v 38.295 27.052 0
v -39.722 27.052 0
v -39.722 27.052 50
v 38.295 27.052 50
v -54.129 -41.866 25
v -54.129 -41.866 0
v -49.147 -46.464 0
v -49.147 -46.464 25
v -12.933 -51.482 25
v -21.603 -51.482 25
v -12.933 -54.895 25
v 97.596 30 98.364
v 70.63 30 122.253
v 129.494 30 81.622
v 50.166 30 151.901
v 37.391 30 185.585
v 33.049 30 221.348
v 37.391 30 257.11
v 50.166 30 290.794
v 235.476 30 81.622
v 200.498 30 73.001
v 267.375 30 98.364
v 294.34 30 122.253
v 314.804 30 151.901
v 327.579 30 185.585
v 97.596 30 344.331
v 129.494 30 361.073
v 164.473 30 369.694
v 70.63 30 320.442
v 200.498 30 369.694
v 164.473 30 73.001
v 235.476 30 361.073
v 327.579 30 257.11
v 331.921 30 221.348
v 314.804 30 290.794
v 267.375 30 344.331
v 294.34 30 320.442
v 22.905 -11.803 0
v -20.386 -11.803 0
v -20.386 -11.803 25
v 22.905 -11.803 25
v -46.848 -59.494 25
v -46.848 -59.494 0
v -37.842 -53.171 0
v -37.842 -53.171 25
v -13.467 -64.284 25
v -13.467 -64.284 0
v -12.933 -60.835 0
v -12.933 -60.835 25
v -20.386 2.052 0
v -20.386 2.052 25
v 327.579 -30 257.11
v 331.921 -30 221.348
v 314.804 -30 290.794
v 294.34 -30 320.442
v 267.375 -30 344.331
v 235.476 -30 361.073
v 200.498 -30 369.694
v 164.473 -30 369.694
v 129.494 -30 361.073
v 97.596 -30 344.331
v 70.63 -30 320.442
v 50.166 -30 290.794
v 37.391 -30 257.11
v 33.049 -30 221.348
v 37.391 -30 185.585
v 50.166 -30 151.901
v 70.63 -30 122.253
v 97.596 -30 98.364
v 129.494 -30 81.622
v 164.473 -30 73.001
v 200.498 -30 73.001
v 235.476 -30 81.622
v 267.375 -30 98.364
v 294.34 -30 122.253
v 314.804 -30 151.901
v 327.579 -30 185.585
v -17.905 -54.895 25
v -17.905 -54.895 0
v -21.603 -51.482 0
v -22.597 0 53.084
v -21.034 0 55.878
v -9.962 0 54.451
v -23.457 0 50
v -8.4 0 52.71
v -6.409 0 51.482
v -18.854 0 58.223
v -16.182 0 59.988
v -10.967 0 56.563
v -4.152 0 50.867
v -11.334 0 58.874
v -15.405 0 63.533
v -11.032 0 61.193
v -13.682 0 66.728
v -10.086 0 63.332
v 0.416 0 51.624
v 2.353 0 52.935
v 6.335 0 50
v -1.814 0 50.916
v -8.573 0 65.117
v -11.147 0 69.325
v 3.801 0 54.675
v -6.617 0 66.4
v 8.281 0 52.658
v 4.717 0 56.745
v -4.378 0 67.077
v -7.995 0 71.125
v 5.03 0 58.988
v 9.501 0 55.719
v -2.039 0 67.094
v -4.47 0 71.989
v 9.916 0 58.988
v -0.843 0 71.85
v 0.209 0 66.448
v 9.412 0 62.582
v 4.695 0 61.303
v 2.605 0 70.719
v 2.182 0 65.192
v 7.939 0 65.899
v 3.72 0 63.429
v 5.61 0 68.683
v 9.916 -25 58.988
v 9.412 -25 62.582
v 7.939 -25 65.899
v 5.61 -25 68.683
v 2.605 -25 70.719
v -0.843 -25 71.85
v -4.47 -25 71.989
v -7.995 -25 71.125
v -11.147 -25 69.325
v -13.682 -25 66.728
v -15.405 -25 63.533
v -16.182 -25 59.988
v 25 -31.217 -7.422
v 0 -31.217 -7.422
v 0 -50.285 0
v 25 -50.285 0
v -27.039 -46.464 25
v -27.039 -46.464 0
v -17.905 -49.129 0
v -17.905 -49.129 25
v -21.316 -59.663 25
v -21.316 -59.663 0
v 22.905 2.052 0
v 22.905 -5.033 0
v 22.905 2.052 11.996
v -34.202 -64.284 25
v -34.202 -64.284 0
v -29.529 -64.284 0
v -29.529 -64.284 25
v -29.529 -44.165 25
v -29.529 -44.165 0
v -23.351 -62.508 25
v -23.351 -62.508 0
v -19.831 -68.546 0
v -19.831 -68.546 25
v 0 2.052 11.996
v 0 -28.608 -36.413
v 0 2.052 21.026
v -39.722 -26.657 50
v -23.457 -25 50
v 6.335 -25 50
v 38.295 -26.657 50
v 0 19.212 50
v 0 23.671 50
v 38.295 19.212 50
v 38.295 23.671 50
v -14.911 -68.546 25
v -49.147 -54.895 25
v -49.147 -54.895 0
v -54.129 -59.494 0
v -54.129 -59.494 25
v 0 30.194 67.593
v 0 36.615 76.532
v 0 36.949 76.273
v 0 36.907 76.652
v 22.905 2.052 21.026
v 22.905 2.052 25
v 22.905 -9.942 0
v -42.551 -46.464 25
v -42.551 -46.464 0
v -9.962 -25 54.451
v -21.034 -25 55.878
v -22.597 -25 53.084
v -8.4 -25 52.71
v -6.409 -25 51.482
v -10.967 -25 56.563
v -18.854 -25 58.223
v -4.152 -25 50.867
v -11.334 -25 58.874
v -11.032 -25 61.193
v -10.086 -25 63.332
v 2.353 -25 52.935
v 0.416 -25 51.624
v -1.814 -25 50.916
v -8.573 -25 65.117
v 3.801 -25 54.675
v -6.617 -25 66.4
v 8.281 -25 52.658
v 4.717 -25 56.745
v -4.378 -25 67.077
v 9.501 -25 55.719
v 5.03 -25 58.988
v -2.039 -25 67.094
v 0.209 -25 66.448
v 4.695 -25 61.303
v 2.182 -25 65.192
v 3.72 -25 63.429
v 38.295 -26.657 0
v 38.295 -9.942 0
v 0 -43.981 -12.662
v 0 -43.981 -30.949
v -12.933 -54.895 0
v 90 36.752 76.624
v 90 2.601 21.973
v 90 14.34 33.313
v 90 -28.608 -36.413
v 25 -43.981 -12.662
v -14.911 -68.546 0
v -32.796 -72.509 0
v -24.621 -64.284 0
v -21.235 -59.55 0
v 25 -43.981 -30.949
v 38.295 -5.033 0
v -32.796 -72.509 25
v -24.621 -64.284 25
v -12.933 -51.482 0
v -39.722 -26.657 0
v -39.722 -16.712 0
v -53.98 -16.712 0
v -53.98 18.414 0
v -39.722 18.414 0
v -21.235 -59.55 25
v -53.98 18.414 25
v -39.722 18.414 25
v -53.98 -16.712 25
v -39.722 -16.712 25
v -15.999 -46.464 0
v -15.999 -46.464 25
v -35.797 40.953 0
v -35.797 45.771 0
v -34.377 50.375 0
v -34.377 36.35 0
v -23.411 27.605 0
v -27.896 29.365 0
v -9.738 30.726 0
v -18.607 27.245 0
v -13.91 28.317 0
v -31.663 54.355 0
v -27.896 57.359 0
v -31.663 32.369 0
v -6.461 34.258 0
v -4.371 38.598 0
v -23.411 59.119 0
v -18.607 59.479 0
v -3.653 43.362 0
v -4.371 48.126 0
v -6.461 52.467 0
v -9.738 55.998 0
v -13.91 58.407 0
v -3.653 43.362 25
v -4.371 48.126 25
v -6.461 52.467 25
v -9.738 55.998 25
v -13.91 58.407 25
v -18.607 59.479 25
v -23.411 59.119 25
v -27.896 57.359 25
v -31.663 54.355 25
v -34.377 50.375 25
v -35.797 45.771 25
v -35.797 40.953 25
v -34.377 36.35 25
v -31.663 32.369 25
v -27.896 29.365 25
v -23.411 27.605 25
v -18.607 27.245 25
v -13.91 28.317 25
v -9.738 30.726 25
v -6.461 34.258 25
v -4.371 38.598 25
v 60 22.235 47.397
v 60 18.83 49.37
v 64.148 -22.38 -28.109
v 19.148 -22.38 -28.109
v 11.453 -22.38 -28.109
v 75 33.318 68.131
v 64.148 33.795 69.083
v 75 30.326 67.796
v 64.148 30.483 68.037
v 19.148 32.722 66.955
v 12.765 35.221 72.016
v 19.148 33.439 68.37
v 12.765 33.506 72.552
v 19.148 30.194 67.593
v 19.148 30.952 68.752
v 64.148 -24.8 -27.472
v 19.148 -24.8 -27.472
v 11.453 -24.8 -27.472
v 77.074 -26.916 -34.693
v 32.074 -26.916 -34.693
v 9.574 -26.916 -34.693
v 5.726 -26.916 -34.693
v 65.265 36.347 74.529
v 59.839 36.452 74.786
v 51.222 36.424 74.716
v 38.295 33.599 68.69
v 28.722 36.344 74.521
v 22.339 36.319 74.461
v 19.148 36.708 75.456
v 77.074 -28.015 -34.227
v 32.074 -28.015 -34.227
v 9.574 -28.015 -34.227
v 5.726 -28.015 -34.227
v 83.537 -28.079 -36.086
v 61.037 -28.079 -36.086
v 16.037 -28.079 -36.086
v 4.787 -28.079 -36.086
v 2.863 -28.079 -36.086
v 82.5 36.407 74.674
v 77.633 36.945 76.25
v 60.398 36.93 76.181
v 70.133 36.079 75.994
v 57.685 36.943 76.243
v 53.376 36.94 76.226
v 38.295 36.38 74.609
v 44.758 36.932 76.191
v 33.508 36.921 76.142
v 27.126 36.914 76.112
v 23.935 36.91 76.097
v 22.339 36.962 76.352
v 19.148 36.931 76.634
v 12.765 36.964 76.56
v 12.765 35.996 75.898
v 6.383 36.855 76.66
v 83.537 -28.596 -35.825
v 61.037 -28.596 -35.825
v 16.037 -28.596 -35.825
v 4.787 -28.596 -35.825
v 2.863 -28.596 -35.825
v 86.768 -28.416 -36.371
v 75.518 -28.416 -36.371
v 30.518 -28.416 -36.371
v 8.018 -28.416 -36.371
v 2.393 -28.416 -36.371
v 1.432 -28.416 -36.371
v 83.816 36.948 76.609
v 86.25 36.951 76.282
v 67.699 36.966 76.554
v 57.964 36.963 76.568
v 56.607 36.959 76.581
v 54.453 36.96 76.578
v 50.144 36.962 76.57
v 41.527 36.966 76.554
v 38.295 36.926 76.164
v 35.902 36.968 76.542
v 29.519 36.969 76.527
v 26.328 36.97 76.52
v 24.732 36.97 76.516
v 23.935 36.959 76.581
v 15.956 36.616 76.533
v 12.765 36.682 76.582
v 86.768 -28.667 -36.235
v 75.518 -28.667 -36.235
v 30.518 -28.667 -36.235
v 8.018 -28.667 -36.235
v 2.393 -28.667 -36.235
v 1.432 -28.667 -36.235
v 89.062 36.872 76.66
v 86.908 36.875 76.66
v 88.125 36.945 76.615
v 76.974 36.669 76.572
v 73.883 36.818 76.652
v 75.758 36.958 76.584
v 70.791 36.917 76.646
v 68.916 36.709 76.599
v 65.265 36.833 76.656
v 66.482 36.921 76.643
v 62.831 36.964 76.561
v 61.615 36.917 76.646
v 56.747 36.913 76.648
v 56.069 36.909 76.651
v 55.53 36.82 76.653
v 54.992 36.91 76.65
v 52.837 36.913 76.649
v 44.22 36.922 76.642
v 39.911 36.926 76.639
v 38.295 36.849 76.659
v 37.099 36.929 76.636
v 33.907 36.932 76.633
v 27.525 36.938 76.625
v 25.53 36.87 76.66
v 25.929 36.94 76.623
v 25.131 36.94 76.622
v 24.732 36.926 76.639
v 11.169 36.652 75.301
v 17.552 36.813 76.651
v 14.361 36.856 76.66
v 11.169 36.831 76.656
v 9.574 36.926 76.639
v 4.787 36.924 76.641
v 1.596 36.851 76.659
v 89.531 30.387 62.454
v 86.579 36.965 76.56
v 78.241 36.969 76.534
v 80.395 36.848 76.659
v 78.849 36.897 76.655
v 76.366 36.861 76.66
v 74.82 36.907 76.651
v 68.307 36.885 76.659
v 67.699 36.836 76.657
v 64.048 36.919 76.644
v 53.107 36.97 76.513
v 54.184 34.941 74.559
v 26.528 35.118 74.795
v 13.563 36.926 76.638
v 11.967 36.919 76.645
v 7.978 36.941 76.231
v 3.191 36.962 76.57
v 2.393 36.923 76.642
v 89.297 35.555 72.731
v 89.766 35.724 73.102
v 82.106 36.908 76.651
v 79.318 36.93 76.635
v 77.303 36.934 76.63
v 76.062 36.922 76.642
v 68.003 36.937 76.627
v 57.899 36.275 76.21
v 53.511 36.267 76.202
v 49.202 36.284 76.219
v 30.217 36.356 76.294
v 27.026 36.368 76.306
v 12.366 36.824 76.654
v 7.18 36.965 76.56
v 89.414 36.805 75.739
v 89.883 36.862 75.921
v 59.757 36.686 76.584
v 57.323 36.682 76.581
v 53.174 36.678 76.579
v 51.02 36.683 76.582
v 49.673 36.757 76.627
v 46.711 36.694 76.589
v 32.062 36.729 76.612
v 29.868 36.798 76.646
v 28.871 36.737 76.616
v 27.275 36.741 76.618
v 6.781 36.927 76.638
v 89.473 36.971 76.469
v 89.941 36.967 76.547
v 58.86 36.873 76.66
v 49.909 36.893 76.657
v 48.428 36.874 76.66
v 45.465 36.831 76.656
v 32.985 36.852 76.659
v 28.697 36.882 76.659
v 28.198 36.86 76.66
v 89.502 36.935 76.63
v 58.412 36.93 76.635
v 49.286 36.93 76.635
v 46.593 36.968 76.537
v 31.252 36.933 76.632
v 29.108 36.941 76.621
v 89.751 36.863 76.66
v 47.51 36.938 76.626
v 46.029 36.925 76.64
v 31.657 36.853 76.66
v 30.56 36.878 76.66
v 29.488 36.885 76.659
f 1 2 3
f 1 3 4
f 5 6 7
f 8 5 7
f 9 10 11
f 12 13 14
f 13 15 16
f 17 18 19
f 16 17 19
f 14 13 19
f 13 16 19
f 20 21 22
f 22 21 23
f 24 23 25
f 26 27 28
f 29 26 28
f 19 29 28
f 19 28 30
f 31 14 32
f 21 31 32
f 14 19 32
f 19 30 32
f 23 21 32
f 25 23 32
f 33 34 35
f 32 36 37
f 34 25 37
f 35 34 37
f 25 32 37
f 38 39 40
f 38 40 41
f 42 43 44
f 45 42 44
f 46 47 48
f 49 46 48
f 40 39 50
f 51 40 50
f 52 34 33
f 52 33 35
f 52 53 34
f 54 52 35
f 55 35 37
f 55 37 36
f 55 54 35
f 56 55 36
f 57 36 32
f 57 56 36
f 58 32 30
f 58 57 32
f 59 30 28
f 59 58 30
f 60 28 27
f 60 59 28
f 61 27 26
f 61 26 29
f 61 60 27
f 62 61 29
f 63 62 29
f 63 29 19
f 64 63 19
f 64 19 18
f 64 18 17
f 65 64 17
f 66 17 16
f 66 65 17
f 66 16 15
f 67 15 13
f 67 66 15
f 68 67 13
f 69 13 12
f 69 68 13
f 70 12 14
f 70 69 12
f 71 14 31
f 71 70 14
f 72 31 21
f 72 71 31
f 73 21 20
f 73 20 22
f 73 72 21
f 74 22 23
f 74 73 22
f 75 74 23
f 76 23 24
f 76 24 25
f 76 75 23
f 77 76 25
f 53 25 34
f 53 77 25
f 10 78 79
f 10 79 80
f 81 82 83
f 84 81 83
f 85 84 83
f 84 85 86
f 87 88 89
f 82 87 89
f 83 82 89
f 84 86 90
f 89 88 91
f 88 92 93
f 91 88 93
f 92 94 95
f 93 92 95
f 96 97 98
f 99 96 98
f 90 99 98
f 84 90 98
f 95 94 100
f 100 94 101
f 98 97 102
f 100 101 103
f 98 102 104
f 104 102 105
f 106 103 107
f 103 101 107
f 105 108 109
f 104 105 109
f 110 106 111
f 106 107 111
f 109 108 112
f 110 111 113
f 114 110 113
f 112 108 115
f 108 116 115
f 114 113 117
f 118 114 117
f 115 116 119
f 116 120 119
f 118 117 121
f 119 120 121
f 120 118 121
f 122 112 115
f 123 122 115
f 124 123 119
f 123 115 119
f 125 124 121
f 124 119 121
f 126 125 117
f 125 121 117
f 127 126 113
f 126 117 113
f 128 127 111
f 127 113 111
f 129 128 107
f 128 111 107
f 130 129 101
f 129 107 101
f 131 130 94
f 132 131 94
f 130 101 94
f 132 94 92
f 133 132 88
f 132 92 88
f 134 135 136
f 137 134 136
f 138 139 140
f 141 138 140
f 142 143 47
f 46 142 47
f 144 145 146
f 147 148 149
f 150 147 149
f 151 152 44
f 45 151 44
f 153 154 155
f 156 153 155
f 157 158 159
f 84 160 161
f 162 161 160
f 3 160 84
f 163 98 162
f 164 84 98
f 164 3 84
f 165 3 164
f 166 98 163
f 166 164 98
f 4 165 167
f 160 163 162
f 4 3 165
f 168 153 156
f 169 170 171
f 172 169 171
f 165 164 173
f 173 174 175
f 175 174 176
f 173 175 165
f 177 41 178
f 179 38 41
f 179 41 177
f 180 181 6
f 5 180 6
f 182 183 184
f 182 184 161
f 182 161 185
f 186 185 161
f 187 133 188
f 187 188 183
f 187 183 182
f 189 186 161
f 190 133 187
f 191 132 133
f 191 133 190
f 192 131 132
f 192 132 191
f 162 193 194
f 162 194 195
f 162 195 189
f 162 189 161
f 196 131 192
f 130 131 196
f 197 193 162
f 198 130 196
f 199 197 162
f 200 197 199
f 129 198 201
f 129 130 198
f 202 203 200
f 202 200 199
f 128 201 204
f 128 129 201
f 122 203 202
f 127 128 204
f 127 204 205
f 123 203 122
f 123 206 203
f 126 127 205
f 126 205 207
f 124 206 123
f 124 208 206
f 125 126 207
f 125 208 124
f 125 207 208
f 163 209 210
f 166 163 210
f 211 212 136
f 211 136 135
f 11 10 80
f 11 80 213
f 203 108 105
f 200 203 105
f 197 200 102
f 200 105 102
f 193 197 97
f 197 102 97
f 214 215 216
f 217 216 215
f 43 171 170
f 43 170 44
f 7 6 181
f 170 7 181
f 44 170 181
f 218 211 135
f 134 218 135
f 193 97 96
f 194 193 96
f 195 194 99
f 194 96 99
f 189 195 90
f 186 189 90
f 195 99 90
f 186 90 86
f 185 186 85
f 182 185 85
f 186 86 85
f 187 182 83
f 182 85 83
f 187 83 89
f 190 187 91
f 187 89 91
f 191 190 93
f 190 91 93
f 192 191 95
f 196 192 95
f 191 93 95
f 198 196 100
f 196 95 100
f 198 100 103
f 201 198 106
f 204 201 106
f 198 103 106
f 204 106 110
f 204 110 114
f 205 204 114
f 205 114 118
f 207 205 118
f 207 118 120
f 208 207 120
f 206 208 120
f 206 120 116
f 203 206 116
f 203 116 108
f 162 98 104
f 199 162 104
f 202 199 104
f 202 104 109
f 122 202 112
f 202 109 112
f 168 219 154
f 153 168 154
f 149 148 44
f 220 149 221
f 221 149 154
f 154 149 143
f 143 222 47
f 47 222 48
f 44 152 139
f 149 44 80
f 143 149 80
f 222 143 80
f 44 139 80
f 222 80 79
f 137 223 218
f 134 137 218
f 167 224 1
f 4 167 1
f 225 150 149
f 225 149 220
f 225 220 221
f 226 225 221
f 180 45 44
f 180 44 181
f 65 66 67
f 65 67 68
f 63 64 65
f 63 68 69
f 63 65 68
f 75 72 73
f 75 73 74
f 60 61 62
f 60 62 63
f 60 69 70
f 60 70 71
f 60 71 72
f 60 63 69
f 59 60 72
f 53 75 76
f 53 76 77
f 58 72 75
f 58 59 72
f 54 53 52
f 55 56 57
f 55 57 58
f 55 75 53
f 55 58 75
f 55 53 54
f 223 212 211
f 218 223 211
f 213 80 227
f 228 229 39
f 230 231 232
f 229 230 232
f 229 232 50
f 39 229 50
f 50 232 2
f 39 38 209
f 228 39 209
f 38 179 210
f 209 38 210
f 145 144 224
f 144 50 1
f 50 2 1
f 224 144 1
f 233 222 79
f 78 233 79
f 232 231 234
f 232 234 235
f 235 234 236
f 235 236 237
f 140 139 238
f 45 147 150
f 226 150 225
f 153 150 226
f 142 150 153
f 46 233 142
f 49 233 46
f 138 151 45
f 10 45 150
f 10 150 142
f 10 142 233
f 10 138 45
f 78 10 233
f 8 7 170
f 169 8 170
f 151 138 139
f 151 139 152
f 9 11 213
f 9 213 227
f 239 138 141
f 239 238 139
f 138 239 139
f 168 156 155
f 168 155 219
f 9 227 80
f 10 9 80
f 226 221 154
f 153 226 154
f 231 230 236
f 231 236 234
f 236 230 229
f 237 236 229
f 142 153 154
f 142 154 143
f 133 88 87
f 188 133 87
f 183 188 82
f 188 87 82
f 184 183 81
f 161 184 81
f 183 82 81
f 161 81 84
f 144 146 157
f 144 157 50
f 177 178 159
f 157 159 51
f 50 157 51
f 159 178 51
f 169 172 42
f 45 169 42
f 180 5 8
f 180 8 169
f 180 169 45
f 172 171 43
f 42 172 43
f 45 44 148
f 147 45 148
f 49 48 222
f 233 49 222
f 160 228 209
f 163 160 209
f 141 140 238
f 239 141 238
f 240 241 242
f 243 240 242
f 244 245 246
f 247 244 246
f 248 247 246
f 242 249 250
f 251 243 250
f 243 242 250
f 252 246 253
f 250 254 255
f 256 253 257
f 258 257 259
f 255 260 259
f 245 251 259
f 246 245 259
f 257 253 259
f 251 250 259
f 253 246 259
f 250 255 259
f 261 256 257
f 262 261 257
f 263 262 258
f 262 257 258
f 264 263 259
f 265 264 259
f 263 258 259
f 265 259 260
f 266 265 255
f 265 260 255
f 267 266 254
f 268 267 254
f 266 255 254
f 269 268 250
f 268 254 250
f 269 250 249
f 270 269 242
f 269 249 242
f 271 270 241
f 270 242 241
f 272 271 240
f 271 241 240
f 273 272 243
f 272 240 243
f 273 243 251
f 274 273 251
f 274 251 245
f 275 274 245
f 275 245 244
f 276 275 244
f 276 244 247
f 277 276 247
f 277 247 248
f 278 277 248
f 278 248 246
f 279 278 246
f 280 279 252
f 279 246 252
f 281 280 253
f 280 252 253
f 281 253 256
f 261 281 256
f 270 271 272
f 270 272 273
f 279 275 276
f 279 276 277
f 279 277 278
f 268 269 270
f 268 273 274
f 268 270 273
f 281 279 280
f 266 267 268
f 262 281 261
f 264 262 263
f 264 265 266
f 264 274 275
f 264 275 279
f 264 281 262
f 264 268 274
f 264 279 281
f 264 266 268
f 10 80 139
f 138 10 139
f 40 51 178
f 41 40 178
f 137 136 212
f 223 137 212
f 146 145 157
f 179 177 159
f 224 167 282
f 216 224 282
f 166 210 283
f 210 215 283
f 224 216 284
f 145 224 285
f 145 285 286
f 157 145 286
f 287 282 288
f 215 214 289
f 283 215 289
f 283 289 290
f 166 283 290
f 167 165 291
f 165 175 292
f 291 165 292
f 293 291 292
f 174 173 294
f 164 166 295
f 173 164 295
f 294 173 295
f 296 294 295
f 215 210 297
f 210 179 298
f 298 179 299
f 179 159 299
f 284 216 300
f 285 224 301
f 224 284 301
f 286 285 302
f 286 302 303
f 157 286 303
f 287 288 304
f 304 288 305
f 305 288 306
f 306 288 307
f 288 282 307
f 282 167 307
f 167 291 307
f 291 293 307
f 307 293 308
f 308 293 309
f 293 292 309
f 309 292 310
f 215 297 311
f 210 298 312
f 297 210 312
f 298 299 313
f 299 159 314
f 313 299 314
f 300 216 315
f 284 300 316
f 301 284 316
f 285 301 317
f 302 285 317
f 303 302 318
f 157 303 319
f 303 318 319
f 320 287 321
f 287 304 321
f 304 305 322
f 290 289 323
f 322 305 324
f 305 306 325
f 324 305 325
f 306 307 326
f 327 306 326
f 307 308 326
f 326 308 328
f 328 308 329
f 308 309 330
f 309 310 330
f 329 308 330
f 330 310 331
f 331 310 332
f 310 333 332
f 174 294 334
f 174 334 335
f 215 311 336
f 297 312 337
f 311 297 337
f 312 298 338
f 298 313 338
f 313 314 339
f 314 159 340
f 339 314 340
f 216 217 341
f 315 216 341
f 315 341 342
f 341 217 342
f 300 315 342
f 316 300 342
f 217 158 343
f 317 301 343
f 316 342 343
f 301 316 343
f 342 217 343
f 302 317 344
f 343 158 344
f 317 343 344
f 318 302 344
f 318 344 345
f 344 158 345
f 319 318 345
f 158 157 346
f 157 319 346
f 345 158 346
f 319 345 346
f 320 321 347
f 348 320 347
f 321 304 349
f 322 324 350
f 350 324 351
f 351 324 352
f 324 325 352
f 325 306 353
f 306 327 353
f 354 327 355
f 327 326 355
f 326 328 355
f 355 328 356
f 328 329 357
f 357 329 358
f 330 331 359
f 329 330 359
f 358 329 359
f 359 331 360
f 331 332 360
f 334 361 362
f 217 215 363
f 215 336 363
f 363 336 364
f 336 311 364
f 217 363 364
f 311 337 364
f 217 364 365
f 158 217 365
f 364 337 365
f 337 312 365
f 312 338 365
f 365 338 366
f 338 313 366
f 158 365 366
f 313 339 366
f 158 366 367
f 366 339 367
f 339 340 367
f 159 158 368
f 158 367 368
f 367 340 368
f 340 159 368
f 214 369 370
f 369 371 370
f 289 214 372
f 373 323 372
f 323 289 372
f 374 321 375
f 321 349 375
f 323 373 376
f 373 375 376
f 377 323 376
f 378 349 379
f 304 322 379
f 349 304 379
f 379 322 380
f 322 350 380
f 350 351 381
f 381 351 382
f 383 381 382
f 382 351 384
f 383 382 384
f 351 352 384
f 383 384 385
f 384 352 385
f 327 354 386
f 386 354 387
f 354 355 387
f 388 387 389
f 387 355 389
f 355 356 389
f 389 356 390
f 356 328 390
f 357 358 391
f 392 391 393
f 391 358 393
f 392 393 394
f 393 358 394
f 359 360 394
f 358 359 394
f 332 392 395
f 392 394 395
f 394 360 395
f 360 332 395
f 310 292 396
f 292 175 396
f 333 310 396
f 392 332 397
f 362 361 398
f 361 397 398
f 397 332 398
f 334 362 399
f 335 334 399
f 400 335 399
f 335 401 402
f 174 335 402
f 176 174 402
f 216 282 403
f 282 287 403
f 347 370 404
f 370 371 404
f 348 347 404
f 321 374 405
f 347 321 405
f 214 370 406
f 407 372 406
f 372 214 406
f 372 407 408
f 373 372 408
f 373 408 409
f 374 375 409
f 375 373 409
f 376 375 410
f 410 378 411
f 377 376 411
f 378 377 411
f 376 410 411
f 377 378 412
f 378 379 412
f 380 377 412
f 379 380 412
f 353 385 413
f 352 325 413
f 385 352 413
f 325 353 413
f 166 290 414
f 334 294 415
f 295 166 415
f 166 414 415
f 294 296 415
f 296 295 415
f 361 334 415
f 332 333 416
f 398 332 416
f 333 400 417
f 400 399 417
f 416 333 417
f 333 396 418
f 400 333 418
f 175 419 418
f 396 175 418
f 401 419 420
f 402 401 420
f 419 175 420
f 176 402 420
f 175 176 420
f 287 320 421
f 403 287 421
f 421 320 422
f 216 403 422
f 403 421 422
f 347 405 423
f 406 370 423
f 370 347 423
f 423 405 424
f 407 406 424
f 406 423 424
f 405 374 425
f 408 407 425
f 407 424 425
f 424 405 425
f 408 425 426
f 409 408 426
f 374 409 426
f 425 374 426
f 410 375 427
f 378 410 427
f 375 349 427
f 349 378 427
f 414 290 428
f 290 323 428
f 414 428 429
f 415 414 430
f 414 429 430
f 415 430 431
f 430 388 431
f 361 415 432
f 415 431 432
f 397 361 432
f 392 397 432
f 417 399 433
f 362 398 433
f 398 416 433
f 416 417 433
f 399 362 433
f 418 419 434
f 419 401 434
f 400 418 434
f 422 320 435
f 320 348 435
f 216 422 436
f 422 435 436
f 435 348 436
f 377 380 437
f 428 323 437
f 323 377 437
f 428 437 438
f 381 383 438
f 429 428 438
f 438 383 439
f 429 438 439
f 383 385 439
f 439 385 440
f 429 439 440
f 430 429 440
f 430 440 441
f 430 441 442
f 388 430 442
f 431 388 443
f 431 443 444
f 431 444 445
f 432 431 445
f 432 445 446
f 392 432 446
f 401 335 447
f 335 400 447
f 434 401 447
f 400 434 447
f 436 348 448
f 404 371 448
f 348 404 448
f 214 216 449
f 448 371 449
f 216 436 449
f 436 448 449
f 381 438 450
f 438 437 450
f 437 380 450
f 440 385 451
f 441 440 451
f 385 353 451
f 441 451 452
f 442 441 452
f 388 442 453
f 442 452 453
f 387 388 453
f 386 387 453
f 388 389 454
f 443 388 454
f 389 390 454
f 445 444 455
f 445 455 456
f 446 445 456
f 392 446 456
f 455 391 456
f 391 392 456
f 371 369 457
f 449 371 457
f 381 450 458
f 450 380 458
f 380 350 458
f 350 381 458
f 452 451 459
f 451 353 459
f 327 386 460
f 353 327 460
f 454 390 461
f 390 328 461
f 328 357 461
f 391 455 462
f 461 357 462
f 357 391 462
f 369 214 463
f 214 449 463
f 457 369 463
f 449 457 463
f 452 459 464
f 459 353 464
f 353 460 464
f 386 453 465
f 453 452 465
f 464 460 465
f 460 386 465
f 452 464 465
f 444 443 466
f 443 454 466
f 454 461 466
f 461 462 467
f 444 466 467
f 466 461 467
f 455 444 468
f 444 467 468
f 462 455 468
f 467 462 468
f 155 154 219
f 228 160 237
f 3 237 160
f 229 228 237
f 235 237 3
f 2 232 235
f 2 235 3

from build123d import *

# Parameters (mm, degrees)
F0_W      = 78.0171081424
F0_H      = 53.7091065198
F1_DEPTH  = 50
F2_W      = 43.2913936675
F2_H      = 23.38198293
F3_DEPTH  = 25
F4_R      = 16.1622843201
F5_DEPTH  = 25
F6_W      = 29.7429226339
F6_H      = 35.126041621
F7_DEPTH  = 25
F1_FACE_W = 78.0171081424
F1_FACE_H = 50
F9_DEPTH  = 25
F11_DEPTH = 25
F13_DEPTH = 25
F15_DEPTH = 90
F16_R     = 149.4362967726
F17_DEPTH = 30
F19_DEPTH = 30


with BuildPart() as f1:
    # F0 (on Top) → F1 (new body)
    with BuildSketch(Plane.XY):
        with Locations((-0.7131882012, 0.1975884661)):
            Rectangle(F0_W, F0_H)
    extrude(amount=F1_DEPTH)

    # F2 (on Top) → F3 (cut)
    with BuildSketch(Plane.XY):
        with Locations((1.2593660504, -0.1119184308)):
            Rectangle(F2_W, F2_H)
    extrude(amount=F3_DEPTH, mode=Mode.SUBTRACT)

    # F6 (on Top) → F7 (join)
    with BuildSketch(Plane.XY):
        with Locations((-39.1089785844, 0.8506774902)):
            Rectangle(F6_W, F6_H)
    extrude(amount=F7_DEPTH)

    # F8 (on Front) + F1_face (on face) → F9 (join)
    with BuildSketch(Plane.XZ):
        with BuildLine():
            ThreePointArc((3.3052529521, 47.6262945357), (8.1429830955, 52.4153057463), (9.915911021, 58.9875951409))
            ThreePointArc((9.915911021, 58.9875951409), (-2.6518951553, 72.046294914), (-16.1823284794, 59.9878221287))
            ThreePointArc((-16.1823284794, 59.9878221287), (-13.6492071487, 60.9517573762), (-10.9743377972, 61.3887342513))
            ThreePointArc((-10.9743377972, 61.3887342513), (-1.9383692631, 67.079241852), (5.0298340639, 58.9875951409))
            ThreePointArc((5.0298340639, 58.9875951409), (4.3308110545, 55.678445285), (2.3531799715, 52.9347103786))
            ThreePointArc((2.3531799715, 52.9347103786), (3.068034148, 50.4889118941), (3.3091991882, 47.9522238677))
            ThreePointArc((3.3091991882, 47.9522238677), (3.308212593, 47.7892472572), (3.3052529521, 47.6262945357))
        make_face()
        with BuildLine():
            ThreePointArc((-10.9743377972, 61.3887342513), (-13.6492071487, 60.9517573762), (-16.1823284794, 59.9878221287))
            ThreePointArc((-16.1823284794, 59.9878221287), (-10.1524259154, 47.9522238677), (3.3052529521, 47.6262945357))
            ThreePointArc((3.3052529521, 47.6262945357), (3.308212593, 47.7892472572), (3.3091991882, 47.9522238677))
            ThreePointArc((3.3091991882, 47.9522238677), (3.068034148, 50.4889118941), (2.3531799715, 52.9347103786))
            ThreePointArc((2.3531799715, 52.9347103786), (-7.5351904678, 52.0782178864), (-10.9743377972, 61.3887342513))
        make_face()
        with BuildLine():
            ThreePointArc((3.3052529521, 47.6262945357), (-10.1524259154, 47.9522238677), (-16.1823284794, 59.9878221287))
            ThreePointArc((-16.1823284794, 59.9878221287), (-17.3631683399, 36.5847024087), (3.3052529521, 47.6262945357))
        make_face()
    with BuildSketch(Plane(origin=(-0.7131882012, 27.052141726, 25), x_dir=(-1, 0, 0), z_dir=(0, 1, 0))):
        Rectangle(F1_FACE_W, F1_FACE_H)
    extrude(amount=F9_DEPTH, dir=(0, -1, 0))

    # F14 (on Right) → F15 (join)
    with BuildSketch(Plane.YZ):
        with BuildLine():
            add(Edge.make_bspline(
                [(-28.6080688917, -36.4129050816), (-25.2024638091, -38.386493406), (22.2351358673, 47.396507483), (69.6727355437, 133.1795083721), (18.8295307847, 49.3700958075), (-32.0136739743, -34.4393167572), (-28.6080688917, -36.4129050816)],
                knots=[0, 0, 0, 2.0943951024, 2.0943951024, 4.1887902048, 4.1887902048, 6.2831853072, 6.2831853072, 6.2831853072], degree=2, weights=[1, 0.5, 1, 0.5, 1, 0.5, 1]))
        make_face()
    extrude(amount=F15_DEPTH)


with BuildPart() as f5:
    # F4 (on Top) → F5 (new body)
    with BuildSketch(Plane.XY):
        with Locations((-19.81501095, 43.3620885015)):
            Circle(F4_R)
    extrude(amount=F5_DEPTH)


with BuildPart() as f11:
    # F10 (on Right) → F11 (new body)
    with BuildSketch(Plane.YZ):
        Polygon((-43.9814738929, -12.6620400697), (-31.2165748328, -7.4221915565), (-50.2845384181, 0), align=None)
        Polygon((-43.9814738929, -12.6620400697), (-50.2845384181, 0), (-43.9814738929, -30.9492647648), align=None)
    extrude(amount=F11_DEPTH)


with BuildPart() as f13:
    # F12 (on Top) → F13 (new body)
    with BuildSketch(Plane.XY):
        Polygon((-42.5507641195, -46.4644171298), (-54.1286543012, -41.8658778071), (-49.1468980908, -46.4644171298), (-49.1468980908, -54.8950769007), (-54.1286543012, -59.493612498), (-46.8476302922, -59.493612498), (-37.8421545029, -53.1706213951), align=None)
    extrude(amount=F13_DEPTH)


with BuildPart() as f13b:
    # F12 (on Top) → F13, piece 2 (new body)
    with BuildSketch(Plane.XY):
        Polygon((-15.9990880638, -46.4644171298), (-27.0385400409, -46.4644171298), (-17.9053156136, -49.1292272691), align=None)
    extrude(amount=F13_DEPTH)


with BuildPart() as f13c:
    # F12 (on Top) → F13, piece 3 (new body)
    with BuildSketch(Plane.XY):
        Polygon((-12.9333948717, -51.4816758476), (-21.6031706718, -51.4816758476), (-12.9333948717, -54.8950769007), align=None)
    extrude(amount=F13_DEPTH)


with BuildPart() as f13d:
    # F12 (on Top) → F13, piece 4 (new body)
    with BuildSketch(Plane.XY):
        Polygon((-14.9109957364, -68.5460207202), (-23.3513476815, -62.5083555335), (-19.8312066495, -68.5460207202), align=None)
    extrude(amount=F13_DEPTH)


with BuildPart() as f13e:
    # F12 (on Top) → F13, piece 5 (new body)
    with BuildSketch(Plane.XY):
        Polygon((-29.529418146, -44.1651474684), (-37.8421545029, -53.1706213951), (-34.201644361, -64.2837584019), (-29.529418146, -64.2837584019), (-24.6213525534, -64.2837584019), (-23.3513476815, -62.5083555335), (-21.315818997, -59.662788918), (-21.6031706718, -59.493612498), (-21.2354905552, -59.5504938007), (-17.9053156136, -54.8950769007), (-21.6031706718, -51.4816758476), (-27.0385400409, -46.4644171298), align=None)
        Polygon((-24.6213525534, -64.2837584019), (-29.529418146, -64.2837584019), (-32.7962928402, -72.5088737686), align=None)
        Polygon((-12.9333948717, -60.8348548412), (-21.2354905552, -59.5504938007), (-21.315818997, -59.662788918), (-13.4669514018, -64.2837584019), align=None)
        Polygon((-21.315818997, -59.662788918), (-21.2354905552, -59.5504938007), (-21.6031706718, -59.493612498), align=None)
    extrude(amount=F13_DEPTH)


with BuildPart() as f17:
    # F16 (on Front) → F17 (new body, symmetric)
    with BuildSketch(Plane.XZ):
        with Locations((182.485088706, 221.3477343321)):
            Circle(F16_R)
    extrude(amount=F17_DEPTH, both=True)

    # F18 (on face) → F19 (join)
    with BuildSketch(Plane.XZ.offset(30)):
        Polygon((124.3307366967, 330.522865057), (93.8902646303, 165.1210784912), (222.3787158728, 127.0541101694), (245.722129941, 281.3443541527), align=None)
    extrude(amount=-F19_DEPTH)


solid = Compound([f1.part, f5.part, f11.part, f13.part, f13b.part, f13c.part, f13d.part, f13e.part, f17.part])
